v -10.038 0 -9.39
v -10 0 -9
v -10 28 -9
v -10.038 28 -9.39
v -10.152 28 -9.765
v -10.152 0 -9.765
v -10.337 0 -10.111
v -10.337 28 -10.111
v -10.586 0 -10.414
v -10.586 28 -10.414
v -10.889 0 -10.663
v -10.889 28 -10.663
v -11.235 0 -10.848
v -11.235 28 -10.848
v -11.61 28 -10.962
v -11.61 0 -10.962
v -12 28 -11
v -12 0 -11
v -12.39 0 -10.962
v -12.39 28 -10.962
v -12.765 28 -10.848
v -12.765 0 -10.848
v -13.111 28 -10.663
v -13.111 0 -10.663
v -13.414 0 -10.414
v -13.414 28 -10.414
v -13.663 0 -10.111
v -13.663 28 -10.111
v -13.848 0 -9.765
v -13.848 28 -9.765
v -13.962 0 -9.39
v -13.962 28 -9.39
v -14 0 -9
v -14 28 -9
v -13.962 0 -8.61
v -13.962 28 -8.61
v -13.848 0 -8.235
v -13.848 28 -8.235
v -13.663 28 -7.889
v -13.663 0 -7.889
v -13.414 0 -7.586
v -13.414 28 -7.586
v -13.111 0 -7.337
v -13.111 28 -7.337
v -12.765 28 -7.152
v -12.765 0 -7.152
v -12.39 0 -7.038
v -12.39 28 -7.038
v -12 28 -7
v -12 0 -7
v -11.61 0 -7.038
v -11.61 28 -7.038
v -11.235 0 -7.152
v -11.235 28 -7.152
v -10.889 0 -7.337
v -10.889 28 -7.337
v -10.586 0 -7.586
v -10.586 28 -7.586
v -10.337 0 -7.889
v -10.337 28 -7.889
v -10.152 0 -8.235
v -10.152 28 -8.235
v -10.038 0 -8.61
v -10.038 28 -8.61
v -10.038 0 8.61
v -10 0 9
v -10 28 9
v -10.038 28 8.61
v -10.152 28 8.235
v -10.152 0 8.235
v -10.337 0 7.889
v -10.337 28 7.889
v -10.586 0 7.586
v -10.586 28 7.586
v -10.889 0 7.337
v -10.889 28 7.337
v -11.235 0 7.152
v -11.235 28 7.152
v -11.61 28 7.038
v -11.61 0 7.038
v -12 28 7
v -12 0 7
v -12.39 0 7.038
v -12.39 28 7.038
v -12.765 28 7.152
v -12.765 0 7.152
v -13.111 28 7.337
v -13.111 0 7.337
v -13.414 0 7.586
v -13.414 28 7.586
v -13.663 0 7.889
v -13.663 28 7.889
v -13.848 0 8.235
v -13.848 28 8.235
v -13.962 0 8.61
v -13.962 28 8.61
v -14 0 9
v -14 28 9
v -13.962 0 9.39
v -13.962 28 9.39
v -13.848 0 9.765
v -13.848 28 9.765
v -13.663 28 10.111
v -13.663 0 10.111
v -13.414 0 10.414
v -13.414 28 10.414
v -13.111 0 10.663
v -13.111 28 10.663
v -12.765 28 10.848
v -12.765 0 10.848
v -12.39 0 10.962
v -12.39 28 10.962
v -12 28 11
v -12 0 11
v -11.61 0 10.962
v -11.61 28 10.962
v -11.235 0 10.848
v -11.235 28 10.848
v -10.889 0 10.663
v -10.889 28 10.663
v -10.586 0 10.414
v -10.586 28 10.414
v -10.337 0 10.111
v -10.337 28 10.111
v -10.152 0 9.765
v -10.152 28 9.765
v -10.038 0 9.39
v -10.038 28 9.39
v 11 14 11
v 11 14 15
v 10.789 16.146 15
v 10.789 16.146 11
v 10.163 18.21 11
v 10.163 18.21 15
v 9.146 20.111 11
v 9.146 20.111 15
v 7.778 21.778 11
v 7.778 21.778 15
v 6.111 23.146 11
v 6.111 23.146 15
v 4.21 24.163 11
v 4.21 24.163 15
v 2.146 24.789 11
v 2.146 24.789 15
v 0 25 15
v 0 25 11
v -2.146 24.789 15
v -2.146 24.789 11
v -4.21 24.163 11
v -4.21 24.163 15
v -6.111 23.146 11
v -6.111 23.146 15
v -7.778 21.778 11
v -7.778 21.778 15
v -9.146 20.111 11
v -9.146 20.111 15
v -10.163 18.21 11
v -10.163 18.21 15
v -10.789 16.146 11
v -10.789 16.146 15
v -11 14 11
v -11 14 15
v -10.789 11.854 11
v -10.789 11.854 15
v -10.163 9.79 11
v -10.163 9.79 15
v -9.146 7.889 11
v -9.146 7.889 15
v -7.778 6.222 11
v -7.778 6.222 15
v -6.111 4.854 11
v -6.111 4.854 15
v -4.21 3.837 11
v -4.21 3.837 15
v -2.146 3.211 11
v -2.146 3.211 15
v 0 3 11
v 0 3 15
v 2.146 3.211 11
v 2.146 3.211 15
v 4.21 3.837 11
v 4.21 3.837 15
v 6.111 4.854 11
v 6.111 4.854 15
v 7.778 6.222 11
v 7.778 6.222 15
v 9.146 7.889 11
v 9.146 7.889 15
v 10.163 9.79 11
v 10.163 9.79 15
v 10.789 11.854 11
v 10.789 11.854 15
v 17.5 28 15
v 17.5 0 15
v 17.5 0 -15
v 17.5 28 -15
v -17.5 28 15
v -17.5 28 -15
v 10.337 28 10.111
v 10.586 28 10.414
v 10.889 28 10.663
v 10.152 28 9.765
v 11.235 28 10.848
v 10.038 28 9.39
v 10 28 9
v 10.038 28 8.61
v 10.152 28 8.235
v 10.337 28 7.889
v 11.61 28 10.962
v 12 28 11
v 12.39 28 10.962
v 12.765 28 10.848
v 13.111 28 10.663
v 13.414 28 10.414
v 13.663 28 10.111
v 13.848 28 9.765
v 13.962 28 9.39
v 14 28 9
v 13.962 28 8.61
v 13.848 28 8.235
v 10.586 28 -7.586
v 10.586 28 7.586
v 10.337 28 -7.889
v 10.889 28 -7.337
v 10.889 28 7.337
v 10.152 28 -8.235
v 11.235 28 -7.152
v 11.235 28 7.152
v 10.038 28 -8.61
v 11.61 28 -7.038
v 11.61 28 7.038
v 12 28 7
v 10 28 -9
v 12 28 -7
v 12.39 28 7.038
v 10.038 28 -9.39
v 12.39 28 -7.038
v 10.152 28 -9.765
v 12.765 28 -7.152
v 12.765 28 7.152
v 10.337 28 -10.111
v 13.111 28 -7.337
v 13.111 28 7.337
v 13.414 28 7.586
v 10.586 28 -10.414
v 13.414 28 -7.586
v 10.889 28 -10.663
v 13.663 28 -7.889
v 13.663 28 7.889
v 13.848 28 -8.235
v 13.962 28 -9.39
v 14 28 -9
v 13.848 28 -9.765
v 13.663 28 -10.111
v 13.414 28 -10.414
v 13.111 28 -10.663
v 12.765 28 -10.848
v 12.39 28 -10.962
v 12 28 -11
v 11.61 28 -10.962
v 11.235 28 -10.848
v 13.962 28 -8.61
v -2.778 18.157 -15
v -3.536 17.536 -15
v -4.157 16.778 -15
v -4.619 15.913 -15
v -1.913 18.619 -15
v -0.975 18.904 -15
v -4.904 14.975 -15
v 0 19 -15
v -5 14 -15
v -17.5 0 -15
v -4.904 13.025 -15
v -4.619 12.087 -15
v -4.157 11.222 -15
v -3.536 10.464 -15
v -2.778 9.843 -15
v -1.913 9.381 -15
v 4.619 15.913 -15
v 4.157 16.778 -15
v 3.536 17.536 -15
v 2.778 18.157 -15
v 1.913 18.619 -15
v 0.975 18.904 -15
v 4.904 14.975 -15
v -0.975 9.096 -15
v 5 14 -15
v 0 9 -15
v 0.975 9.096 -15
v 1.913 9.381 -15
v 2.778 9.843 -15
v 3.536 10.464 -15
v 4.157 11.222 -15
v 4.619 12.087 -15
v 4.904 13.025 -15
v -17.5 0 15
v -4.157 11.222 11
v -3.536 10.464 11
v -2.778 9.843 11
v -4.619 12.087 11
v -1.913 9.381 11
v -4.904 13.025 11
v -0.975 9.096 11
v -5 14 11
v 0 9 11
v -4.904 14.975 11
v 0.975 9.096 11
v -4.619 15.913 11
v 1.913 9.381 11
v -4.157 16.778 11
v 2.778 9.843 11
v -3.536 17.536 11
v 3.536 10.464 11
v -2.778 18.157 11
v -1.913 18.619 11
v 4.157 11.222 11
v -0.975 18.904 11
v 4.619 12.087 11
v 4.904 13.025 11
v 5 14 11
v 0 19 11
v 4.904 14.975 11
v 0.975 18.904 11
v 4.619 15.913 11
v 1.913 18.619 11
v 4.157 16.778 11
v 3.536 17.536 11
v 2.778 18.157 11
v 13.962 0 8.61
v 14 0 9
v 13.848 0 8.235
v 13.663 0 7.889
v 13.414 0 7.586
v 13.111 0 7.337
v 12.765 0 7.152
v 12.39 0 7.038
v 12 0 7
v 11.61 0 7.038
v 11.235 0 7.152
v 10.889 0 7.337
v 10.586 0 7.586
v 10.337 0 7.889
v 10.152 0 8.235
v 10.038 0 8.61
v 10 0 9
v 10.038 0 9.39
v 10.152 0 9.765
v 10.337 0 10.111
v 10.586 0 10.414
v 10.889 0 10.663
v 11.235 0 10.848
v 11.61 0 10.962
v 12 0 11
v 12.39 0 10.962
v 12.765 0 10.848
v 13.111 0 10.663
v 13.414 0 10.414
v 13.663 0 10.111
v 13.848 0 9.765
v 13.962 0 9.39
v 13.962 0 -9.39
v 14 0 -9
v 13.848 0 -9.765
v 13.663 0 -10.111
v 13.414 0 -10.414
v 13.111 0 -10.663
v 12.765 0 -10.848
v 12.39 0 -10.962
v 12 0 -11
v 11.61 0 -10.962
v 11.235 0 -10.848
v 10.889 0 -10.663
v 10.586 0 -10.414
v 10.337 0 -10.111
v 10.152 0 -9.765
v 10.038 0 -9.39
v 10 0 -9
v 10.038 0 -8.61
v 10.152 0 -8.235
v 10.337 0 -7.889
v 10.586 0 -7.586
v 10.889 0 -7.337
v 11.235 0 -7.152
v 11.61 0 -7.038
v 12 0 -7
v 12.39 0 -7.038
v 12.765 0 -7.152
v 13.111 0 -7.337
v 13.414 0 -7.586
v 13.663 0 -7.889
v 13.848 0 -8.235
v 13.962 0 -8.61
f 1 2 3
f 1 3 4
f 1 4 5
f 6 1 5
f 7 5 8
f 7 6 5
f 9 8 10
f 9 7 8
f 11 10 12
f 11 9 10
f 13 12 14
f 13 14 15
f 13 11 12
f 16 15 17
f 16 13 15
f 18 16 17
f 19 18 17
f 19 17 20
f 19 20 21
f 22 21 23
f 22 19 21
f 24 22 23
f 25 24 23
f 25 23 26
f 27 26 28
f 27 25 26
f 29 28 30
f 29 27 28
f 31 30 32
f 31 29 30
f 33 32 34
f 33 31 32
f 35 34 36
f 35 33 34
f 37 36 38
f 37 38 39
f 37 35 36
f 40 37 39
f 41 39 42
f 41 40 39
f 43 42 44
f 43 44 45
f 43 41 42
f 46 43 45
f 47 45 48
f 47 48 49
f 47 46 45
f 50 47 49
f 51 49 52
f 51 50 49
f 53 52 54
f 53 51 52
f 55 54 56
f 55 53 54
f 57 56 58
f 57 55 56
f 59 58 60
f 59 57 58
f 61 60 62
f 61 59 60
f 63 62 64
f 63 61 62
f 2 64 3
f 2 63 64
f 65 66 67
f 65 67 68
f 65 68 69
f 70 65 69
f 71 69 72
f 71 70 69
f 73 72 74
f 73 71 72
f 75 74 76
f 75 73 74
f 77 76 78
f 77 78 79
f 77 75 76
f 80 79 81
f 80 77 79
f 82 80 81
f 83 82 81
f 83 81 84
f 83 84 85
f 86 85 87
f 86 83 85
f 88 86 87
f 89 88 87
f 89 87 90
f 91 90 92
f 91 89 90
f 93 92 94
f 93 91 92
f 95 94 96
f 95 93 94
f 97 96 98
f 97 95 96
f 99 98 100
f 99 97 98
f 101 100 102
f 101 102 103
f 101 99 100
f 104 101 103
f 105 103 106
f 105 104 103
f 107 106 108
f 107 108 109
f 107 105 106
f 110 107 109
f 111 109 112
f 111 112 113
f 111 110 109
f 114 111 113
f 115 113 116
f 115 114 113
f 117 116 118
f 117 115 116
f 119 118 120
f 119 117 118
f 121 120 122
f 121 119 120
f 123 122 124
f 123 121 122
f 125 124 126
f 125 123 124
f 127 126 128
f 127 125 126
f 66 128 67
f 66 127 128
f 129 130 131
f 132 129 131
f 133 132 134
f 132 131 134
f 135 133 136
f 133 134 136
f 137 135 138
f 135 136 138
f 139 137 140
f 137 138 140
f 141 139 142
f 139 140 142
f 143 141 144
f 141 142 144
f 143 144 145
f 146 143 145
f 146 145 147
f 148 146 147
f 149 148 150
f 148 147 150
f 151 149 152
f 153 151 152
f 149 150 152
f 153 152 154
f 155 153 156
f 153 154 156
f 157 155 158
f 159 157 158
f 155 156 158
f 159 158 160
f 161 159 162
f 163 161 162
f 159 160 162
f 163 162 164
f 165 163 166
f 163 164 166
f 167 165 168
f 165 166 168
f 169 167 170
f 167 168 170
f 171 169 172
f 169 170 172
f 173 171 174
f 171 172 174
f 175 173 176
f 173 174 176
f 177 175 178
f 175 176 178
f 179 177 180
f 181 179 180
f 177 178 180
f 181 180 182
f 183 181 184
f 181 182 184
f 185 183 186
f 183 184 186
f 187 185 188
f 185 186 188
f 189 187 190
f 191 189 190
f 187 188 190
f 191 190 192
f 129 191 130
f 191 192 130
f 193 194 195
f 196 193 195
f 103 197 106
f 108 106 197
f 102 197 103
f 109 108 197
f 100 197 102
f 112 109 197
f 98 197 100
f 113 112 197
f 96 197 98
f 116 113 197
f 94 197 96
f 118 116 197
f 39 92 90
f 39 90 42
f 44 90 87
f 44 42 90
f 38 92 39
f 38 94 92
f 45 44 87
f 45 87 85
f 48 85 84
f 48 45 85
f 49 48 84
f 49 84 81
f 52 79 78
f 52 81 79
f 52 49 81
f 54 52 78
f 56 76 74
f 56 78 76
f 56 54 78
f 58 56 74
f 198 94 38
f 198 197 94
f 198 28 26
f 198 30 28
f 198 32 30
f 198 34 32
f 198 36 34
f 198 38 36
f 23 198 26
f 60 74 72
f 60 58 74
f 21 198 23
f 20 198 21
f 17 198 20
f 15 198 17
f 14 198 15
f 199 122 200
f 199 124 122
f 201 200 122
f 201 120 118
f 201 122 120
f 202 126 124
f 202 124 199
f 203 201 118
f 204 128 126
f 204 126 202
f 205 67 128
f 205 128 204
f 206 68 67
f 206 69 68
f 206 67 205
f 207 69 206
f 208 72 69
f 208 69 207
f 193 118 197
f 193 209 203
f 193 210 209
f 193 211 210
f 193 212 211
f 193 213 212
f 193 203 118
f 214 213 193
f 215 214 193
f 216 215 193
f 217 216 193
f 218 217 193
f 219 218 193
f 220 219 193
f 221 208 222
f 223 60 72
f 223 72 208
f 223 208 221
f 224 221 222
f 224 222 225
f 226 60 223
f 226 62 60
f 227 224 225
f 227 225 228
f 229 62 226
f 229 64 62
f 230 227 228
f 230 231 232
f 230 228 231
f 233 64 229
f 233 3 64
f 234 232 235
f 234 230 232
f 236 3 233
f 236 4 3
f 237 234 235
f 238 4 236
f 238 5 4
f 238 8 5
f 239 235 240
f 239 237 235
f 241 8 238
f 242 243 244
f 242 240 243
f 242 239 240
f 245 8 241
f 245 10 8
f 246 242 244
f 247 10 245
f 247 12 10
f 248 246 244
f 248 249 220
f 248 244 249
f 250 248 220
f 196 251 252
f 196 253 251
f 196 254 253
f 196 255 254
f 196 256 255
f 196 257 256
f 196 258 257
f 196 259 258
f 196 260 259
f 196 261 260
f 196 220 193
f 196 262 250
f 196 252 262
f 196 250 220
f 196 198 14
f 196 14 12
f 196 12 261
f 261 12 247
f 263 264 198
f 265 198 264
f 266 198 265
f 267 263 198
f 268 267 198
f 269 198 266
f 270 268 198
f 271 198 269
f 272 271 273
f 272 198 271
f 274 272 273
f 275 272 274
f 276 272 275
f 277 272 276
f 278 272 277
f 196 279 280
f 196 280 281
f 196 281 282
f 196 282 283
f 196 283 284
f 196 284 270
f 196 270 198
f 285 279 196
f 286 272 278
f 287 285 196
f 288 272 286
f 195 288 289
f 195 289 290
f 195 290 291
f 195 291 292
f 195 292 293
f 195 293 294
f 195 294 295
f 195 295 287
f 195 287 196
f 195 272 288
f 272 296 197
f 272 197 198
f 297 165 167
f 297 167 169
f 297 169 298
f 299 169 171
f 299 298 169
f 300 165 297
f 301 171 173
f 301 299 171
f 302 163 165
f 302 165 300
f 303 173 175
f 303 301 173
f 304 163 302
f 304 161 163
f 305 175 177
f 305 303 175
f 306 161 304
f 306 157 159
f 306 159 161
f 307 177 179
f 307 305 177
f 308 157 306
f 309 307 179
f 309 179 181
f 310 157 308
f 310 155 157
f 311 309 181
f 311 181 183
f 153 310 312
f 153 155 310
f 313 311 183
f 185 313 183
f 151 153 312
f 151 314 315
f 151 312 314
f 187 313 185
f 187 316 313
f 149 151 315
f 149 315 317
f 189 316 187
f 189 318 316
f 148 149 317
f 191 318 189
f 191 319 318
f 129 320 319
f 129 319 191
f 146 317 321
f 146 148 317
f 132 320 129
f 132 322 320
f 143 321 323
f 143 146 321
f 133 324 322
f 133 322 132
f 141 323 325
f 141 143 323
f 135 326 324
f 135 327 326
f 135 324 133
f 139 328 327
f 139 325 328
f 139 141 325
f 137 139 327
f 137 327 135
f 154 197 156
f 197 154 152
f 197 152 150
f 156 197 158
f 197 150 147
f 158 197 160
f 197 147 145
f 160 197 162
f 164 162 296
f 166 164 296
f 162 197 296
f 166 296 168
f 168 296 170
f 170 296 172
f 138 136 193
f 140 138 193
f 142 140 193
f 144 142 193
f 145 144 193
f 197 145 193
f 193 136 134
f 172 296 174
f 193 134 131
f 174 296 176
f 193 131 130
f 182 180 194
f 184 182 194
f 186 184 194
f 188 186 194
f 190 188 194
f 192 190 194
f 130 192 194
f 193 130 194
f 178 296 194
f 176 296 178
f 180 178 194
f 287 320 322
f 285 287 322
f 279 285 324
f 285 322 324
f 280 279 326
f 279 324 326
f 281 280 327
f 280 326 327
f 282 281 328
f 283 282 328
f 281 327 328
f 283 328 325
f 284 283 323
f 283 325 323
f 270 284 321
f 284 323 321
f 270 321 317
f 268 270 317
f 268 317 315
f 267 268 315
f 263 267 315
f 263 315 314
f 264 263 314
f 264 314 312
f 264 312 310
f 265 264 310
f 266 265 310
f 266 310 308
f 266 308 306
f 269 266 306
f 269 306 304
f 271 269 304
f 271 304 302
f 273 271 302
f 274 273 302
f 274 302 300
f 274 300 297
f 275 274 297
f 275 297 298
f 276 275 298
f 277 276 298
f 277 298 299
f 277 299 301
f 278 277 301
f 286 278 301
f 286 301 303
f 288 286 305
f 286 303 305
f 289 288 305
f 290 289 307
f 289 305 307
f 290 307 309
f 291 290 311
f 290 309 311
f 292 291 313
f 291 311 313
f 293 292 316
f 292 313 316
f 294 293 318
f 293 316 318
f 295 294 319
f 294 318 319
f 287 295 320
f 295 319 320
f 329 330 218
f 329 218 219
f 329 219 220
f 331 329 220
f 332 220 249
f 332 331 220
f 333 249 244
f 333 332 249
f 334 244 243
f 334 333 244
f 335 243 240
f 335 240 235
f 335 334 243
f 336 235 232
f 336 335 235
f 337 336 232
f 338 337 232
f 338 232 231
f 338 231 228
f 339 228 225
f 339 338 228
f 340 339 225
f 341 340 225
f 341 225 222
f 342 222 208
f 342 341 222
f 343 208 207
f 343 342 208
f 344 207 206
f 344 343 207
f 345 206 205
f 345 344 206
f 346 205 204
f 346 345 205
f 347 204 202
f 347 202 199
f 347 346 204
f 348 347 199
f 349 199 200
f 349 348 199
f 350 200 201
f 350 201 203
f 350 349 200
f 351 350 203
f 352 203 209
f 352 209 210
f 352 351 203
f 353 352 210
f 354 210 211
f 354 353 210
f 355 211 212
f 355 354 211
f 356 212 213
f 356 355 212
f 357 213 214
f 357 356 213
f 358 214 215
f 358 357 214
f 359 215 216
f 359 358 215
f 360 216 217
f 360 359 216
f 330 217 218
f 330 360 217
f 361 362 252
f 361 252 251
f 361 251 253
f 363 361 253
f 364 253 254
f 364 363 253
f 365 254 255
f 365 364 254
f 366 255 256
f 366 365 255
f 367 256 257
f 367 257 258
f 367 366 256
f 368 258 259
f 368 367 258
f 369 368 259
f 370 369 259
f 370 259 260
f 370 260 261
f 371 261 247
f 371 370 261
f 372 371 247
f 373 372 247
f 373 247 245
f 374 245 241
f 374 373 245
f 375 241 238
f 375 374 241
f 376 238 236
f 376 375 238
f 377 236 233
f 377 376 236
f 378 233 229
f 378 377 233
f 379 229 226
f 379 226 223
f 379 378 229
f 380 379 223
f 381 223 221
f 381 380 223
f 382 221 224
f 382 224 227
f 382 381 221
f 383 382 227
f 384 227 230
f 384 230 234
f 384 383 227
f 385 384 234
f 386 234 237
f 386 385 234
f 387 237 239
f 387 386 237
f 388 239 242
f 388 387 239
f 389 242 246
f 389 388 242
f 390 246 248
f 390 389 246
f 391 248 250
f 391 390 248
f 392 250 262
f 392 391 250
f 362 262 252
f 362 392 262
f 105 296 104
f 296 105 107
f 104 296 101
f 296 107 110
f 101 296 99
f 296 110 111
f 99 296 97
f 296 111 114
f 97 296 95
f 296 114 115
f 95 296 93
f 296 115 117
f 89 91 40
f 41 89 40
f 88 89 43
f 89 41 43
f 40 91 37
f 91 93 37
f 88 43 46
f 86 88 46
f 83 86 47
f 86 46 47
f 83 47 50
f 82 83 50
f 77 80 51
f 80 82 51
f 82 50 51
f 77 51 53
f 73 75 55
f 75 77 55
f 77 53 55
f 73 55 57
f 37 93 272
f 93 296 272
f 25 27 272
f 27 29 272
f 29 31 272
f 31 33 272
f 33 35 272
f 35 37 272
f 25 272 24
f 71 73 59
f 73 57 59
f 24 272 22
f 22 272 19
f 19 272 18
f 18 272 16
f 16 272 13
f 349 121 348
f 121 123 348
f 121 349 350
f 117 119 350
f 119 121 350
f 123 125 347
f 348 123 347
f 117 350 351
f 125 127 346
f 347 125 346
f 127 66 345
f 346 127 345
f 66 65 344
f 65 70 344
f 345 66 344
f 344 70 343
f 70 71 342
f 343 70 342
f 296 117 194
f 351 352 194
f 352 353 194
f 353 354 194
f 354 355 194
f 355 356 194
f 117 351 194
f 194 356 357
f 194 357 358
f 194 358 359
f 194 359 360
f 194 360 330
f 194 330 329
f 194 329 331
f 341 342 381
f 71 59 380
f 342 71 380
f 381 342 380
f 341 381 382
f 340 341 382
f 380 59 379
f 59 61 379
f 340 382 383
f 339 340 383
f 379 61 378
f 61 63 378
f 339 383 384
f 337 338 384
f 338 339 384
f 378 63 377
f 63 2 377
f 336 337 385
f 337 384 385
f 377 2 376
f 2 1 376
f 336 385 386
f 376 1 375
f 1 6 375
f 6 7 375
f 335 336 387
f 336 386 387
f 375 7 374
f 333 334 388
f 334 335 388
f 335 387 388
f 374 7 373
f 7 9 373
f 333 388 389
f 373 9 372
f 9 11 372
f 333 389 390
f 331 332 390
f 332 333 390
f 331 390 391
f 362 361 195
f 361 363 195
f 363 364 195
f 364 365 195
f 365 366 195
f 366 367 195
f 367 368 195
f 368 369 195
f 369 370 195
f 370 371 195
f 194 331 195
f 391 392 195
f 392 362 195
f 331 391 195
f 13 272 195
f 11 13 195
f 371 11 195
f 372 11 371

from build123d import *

# Parameters (mm, degrees)
SKETCH1_W           = 35
SKETCH1_H           = 30
SKETCH1_R           = 2
BOSS_EXTRUDE1_DEPTH = 28
SKETCH2_R           = 11
CUT_EXTRUDE1_DEPTH  = 4
SKETCH3_R           = 5
CUT_EXTRUDE2_DEPTH  = 27


with BuildPart() as part:
    # Sketch1 → Boss-Extrude1 (new body)
    with BuildSketch(Plane(origin=(0, 0, 0), x_dir=(1, 0, 0), z_dir=(0, 1, 0))):
        Rectangle(SKETCH1_W, SKETCH1_H)
        with Locations((-12, 9)):
            Circle(SKETCH1_R, mode=Mode.SUBTRACT)
        with Locations((-12, -9)):
            Circle(SKETCH1_R, mode=Mode.SUBTRACT)
        with Locations((12, -9)):
            Circle(SKETCH1_R, mode=Mode.SUBTRACT)
        with Locations((12, 9)):
            Circle(SKETCH1_R, mode=Mode.SUBTRACT)
    extrude(amount=BOSS_EXTRUDE1_DEPTH)

    # Sketch2 → Cut-Extrude1 (cut)
    with BuildSketch(Plane.XY.offset(15)):
        with Locations((0, 14)):
            Circle(SKETCH2_R)
    extrude(amount=-CUT_EXTRUDE1_DEPTH, mode=Mode.SUBTRACT)

    # Sketch3 → Cut-Extrude2 (cut, through all)
    with BuildSketch(Plane.XY.offset(11)):
        with Locations((0, 14)):
            Circle(SKETCH3_R)
    extrude(amount=-CUT_EXTRUDE2_DEPTH, mode=Mode.SUBTRACT)


solid = part.part
